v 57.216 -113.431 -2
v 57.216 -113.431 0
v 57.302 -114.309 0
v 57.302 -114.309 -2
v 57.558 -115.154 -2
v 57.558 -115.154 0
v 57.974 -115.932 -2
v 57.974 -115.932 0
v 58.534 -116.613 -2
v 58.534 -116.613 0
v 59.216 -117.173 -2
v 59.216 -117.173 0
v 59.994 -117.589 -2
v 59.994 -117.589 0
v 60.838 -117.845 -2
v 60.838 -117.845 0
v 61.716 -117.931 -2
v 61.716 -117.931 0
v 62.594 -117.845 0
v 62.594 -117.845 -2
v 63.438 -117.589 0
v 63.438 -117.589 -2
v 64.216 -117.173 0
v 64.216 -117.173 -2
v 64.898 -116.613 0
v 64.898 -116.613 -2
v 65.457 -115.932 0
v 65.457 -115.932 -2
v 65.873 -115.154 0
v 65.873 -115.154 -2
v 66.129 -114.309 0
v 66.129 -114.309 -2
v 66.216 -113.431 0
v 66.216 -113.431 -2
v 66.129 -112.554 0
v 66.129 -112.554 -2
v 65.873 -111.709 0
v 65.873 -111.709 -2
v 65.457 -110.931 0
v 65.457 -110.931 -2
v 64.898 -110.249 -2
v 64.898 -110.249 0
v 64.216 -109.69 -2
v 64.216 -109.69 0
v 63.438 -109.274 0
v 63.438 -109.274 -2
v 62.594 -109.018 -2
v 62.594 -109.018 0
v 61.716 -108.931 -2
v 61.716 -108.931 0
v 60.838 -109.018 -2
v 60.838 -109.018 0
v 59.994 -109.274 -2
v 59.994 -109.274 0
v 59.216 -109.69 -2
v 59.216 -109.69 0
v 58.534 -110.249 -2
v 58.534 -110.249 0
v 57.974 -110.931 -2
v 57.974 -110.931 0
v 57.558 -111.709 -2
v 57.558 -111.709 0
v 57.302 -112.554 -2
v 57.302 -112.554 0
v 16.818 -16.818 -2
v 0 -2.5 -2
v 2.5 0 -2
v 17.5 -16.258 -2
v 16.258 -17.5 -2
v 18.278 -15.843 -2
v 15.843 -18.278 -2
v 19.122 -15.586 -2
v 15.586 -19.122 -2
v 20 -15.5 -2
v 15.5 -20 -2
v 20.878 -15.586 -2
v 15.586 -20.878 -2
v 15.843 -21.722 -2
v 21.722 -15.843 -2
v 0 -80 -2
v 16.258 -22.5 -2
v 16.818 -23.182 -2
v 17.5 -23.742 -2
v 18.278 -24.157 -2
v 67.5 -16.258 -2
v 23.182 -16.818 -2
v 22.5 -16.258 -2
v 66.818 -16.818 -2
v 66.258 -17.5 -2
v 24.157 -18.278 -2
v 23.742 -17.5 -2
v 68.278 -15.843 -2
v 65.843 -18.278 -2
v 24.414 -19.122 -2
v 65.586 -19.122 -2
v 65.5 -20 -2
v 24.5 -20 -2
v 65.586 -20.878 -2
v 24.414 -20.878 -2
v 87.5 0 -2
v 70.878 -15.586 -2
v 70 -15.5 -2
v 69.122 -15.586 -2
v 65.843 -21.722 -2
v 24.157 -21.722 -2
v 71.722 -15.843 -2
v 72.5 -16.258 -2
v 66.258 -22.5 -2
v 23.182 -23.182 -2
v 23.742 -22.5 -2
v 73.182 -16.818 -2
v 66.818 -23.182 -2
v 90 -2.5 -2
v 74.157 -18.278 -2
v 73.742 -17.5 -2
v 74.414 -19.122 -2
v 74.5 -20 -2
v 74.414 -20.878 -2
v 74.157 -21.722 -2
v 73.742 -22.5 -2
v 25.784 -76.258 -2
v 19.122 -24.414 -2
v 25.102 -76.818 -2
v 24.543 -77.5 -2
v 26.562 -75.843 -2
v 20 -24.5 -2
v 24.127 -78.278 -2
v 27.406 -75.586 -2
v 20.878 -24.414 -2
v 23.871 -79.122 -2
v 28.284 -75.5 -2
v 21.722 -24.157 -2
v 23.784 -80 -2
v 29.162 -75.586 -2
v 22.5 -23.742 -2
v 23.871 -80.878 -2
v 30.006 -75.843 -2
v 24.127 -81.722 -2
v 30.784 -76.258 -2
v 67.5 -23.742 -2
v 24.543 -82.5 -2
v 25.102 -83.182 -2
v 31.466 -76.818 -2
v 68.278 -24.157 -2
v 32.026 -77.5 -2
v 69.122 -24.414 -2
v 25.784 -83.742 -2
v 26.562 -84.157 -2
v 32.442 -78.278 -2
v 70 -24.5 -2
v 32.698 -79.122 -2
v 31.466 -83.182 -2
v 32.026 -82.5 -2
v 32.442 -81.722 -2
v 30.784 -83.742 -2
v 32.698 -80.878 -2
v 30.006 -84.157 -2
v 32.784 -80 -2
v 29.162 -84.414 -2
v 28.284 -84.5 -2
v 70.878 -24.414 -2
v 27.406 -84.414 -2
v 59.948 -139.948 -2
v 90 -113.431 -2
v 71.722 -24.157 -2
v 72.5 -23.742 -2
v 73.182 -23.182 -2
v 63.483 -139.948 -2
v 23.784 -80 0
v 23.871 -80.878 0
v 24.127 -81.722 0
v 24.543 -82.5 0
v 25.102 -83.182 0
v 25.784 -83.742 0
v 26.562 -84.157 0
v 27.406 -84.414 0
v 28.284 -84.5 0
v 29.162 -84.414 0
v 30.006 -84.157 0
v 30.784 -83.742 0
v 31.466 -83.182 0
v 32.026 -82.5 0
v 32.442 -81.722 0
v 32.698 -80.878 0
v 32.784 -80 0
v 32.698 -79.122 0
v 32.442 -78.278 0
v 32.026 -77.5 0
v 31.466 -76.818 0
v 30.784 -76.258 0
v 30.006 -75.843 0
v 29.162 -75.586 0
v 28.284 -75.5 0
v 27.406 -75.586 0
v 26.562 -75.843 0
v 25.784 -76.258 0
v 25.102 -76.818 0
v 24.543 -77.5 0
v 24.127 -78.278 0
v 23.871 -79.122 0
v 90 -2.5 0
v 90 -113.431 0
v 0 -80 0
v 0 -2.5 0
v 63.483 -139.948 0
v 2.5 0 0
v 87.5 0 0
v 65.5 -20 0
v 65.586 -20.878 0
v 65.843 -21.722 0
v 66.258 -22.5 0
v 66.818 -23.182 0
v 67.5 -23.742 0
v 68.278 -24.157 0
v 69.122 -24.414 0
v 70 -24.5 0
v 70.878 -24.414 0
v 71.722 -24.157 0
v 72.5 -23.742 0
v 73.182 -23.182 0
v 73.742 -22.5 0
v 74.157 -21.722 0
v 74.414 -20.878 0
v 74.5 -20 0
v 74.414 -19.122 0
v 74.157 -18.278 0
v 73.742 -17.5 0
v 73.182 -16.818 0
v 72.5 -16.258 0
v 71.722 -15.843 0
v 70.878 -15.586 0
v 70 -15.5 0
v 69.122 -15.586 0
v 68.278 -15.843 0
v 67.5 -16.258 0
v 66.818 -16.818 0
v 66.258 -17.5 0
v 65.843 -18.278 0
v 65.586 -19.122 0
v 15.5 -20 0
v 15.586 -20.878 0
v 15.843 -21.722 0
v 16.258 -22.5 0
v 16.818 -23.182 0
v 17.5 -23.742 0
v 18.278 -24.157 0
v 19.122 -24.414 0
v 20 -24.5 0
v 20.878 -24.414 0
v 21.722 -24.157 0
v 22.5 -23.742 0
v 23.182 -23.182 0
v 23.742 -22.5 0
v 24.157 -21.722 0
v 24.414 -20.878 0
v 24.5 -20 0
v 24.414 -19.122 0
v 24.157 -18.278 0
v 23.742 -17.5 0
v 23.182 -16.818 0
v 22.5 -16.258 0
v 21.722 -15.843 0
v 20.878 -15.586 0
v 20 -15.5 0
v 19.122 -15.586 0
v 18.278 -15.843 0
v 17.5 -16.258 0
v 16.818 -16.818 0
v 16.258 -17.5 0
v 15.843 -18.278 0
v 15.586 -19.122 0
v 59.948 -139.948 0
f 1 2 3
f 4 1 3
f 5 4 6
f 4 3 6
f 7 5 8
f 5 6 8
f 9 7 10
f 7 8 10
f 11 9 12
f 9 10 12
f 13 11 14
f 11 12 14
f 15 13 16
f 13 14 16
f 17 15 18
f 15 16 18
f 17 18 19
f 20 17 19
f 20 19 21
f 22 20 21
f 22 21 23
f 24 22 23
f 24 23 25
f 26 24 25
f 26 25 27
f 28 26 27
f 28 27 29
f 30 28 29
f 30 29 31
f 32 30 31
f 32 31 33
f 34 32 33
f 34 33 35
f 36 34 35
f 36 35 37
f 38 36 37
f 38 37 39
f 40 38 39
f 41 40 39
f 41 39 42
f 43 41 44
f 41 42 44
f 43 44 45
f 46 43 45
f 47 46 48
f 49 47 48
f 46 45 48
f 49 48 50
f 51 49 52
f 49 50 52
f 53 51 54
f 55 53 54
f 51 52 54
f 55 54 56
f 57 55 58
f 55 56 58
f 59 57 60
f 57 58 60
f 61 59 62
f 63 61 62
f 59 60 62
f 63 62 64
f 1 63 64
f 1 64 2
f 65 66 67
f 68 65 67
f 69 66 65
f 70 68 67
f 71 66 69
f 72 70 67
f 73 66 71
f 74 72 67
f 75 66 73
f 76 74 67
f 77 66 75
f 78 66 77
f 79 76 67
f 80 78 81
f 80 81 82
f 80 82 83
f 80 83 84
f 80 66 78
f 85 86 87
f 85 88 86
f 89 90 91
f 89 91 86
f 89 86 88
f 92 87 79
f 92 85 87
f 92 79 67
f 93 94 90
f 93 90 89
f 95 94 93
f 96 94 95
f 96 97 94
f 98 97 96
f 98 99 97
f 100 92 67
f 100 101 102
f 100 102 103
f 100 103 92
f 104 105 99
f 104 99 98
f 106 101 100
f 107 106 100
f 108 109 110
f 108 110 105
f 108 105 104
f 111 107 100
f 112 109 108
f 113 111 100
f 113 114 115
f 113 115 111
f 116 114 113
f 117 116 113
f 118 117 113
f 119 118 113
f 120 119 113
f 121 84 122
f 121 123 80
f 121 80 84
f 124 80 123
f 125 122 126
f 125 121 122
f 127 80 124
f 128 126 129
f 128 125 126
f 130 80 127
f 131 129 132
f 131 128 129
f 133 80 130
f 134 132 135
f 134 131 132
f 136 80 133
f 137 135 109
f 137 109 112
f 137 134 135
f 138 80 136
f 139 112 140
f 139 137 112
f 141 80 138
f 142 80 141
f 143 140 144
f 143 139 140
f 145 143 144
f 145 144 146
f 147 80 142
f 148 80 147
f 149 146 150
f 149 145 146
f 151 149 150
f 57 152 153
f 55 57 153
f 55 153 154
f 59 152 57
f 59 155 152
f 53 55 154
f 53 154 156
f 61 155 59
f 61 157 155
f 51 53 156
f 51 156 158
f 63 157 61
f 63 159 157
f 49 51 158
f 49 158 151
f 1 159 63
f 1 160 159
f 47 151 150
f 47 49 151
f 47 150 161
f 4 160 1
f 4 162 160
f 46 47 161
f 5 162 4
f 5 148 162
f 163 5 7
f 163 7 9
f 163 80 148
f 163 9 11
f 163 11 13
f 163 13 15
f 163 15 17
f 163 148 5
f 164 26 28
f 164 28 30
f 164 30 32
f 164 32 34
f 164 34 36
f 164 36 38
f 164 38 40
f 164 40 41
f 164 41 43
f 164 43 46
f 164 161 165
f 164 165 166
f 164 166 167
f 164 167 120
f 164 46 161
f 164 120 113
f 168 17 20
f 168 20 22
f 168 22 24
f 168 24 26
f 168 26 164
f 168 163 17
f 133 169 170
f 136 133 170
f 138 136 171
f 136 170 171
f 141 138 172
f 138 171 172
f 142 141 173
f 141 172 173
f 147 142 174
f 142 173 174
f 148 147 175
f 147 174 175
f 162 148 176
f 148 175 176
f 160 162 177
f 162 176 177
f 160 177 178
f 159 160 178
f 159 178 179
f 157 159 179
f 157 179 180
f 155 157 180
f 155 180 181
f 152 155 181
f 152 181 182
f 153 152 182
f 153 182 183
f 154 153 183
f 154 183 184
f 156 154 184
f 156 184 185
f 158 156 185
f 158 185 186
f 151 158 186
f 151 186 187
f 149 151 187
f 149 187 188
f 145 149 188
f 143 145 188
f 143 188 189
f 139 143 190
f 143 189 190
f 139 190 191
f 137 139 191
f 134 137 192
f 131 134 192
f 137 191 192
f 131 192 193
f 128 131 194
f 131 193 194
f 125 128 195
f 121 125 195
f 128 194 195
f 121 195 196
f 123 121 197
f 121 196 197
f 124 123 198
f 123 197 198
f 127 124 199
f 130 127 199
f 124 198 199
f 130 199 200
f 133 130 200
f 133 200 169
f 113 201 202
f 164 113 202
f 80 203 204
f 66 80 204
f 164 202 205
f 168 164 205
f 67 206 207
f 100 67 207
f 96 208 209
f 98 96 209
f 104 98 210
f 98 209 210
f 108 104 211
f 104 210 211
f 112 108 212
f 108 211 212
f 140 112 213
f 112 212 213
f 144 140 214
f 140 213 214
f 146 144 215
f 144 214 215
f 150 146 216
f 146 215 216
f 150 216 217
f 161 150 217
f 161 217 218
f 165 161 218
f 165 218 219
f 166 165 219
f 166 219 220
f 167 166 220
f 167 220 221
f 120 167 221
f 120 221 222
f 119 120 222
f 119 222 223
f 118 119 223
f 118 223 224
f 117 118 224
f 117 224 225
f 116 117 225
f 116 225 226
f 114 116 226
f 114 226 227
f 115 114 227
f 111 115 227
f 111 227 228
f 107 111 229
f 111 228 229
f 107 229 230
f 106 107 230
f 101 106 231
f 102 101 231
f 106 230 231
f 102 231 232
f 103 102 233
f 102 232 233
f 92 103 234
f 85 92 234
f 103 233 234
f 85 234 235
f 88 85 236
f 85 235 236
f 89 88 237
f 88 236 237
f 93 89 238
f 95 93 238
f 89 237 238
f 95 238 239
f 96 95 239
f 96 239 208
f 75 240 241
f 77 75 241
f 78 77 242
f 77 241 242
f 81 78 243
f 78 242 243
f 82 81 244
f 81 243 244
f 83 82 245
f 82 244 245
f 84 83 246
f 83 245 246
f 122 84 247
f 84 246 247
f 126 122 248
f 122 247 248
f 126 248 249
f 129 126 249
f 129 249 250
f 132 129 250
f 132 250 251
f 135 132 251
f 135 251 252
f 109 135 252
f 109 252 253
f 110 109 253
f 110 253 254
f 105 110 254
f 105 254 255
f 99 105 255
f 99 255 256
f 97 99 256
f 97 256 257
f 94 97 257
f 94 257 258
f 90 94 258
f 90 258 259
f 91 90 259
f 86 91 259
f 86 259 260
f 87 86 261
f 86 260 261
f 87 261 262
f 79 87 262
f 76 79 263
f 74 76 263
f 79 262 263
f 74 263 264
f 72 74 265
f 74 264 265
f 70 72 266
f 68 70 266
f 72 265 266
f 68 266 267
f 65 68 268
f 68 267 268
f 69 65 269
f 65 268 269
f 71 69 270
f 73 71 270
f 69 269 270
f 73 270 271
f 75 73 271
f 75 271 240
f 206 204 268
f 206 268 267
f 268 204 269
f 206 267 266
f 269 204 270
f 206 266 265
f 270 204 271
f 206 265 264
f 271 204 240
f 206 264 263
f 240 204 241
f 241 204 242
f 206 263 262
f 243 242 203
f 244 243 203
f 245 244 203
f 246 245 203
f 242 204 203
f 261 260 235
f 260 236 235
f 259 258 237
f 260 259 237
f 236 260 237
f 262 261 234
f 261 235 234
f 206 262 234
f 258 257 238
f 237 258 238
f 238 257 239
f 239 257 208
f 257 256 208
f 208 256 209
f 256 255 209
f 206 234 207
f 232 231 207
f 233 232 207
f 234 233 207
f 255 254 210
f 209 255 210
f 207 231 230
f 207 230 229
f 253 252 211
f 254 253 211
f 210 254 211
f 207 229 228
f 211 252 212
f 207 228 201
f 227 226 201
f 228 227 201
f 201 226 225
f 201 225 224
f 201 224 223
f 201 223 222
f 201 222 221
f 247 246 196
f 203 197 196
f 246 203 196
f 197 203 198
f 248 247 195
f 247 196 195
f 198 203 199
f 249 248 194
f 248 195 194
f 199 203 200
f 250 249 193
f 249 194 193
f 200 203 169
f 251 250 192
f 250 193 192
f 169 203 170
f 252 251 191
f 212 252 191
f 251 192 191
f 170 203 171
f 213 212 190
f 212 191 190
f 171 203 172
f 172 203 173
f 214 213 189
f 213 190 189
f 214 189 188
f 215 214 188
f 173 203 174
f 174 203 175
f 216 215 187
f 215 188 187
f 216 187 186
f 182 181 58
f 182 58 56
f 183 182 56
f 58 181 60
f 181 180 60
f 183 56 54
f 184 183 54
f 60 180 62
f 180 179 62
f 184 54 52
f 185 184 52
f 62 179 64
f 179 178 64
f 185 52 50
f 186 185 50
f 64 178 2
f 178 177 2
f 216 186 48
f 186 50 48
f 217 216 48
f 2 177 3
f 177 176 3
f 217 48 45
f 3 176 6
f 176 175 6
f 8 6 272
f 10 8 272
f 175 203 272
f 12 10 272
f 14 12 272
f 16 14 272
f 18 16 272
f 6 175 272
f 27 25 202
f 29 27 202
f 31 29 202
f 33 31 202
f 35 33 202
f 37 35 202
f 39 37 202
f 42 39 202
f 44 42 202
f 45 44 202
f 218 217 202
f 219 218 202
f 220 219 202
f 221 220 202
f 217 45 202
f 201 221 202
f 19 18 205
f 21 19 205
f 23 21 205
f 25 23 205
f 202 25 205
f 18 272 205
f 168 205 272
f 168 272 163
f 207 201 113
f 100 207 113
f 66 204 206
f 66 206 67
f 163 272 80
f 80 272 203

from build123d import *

# Parameters (mm, degrees)
EXTRUDE_1_DEPTH   = 2
HOLE_WIZARD_M81_D = 9
CHAMFER_1_SIZE    = 2.5


with BuildPart() as part:
    # Эскиз3 → Бобышка-Вытянуть1 (new body)
    with BuildSketch(Plane(origin=(0, 0, 0), x_dir=(1, 0, 0), z_dir=(0, 0, -1))):
        Polygon((0, 0), (90, 0), (90, 113.431457505), (61.715728753, 141.715728753), (0, 80), align=None)
    extrude(amount=EXTRUDE_1_DEPTH)

    # Отверстие с зазором M81 (through all)
    with Locations(Plane(origin=(0, 0, -2), x_dir=(1, 0, 0), z_dir=(0, 0, -1))):
        with Locations((20, 20), (70, 20), (28.284271247, 80), (61.715728753, 113.431457505)):
            Hole(HOLE_WIZARD_M81_D / 2)

    # Фаска1
    chamfer_1_edges = [part.edges().sort_by_distance(p)[0] for p in [
        (61.715728753, -141.715728753, -1),
        (90, 0, -1),
        (0, 0, -1),
    ]]
    chamfer(chamfer_1_edges, length=CHAMFER_1_SIZE)


solid = part.part
